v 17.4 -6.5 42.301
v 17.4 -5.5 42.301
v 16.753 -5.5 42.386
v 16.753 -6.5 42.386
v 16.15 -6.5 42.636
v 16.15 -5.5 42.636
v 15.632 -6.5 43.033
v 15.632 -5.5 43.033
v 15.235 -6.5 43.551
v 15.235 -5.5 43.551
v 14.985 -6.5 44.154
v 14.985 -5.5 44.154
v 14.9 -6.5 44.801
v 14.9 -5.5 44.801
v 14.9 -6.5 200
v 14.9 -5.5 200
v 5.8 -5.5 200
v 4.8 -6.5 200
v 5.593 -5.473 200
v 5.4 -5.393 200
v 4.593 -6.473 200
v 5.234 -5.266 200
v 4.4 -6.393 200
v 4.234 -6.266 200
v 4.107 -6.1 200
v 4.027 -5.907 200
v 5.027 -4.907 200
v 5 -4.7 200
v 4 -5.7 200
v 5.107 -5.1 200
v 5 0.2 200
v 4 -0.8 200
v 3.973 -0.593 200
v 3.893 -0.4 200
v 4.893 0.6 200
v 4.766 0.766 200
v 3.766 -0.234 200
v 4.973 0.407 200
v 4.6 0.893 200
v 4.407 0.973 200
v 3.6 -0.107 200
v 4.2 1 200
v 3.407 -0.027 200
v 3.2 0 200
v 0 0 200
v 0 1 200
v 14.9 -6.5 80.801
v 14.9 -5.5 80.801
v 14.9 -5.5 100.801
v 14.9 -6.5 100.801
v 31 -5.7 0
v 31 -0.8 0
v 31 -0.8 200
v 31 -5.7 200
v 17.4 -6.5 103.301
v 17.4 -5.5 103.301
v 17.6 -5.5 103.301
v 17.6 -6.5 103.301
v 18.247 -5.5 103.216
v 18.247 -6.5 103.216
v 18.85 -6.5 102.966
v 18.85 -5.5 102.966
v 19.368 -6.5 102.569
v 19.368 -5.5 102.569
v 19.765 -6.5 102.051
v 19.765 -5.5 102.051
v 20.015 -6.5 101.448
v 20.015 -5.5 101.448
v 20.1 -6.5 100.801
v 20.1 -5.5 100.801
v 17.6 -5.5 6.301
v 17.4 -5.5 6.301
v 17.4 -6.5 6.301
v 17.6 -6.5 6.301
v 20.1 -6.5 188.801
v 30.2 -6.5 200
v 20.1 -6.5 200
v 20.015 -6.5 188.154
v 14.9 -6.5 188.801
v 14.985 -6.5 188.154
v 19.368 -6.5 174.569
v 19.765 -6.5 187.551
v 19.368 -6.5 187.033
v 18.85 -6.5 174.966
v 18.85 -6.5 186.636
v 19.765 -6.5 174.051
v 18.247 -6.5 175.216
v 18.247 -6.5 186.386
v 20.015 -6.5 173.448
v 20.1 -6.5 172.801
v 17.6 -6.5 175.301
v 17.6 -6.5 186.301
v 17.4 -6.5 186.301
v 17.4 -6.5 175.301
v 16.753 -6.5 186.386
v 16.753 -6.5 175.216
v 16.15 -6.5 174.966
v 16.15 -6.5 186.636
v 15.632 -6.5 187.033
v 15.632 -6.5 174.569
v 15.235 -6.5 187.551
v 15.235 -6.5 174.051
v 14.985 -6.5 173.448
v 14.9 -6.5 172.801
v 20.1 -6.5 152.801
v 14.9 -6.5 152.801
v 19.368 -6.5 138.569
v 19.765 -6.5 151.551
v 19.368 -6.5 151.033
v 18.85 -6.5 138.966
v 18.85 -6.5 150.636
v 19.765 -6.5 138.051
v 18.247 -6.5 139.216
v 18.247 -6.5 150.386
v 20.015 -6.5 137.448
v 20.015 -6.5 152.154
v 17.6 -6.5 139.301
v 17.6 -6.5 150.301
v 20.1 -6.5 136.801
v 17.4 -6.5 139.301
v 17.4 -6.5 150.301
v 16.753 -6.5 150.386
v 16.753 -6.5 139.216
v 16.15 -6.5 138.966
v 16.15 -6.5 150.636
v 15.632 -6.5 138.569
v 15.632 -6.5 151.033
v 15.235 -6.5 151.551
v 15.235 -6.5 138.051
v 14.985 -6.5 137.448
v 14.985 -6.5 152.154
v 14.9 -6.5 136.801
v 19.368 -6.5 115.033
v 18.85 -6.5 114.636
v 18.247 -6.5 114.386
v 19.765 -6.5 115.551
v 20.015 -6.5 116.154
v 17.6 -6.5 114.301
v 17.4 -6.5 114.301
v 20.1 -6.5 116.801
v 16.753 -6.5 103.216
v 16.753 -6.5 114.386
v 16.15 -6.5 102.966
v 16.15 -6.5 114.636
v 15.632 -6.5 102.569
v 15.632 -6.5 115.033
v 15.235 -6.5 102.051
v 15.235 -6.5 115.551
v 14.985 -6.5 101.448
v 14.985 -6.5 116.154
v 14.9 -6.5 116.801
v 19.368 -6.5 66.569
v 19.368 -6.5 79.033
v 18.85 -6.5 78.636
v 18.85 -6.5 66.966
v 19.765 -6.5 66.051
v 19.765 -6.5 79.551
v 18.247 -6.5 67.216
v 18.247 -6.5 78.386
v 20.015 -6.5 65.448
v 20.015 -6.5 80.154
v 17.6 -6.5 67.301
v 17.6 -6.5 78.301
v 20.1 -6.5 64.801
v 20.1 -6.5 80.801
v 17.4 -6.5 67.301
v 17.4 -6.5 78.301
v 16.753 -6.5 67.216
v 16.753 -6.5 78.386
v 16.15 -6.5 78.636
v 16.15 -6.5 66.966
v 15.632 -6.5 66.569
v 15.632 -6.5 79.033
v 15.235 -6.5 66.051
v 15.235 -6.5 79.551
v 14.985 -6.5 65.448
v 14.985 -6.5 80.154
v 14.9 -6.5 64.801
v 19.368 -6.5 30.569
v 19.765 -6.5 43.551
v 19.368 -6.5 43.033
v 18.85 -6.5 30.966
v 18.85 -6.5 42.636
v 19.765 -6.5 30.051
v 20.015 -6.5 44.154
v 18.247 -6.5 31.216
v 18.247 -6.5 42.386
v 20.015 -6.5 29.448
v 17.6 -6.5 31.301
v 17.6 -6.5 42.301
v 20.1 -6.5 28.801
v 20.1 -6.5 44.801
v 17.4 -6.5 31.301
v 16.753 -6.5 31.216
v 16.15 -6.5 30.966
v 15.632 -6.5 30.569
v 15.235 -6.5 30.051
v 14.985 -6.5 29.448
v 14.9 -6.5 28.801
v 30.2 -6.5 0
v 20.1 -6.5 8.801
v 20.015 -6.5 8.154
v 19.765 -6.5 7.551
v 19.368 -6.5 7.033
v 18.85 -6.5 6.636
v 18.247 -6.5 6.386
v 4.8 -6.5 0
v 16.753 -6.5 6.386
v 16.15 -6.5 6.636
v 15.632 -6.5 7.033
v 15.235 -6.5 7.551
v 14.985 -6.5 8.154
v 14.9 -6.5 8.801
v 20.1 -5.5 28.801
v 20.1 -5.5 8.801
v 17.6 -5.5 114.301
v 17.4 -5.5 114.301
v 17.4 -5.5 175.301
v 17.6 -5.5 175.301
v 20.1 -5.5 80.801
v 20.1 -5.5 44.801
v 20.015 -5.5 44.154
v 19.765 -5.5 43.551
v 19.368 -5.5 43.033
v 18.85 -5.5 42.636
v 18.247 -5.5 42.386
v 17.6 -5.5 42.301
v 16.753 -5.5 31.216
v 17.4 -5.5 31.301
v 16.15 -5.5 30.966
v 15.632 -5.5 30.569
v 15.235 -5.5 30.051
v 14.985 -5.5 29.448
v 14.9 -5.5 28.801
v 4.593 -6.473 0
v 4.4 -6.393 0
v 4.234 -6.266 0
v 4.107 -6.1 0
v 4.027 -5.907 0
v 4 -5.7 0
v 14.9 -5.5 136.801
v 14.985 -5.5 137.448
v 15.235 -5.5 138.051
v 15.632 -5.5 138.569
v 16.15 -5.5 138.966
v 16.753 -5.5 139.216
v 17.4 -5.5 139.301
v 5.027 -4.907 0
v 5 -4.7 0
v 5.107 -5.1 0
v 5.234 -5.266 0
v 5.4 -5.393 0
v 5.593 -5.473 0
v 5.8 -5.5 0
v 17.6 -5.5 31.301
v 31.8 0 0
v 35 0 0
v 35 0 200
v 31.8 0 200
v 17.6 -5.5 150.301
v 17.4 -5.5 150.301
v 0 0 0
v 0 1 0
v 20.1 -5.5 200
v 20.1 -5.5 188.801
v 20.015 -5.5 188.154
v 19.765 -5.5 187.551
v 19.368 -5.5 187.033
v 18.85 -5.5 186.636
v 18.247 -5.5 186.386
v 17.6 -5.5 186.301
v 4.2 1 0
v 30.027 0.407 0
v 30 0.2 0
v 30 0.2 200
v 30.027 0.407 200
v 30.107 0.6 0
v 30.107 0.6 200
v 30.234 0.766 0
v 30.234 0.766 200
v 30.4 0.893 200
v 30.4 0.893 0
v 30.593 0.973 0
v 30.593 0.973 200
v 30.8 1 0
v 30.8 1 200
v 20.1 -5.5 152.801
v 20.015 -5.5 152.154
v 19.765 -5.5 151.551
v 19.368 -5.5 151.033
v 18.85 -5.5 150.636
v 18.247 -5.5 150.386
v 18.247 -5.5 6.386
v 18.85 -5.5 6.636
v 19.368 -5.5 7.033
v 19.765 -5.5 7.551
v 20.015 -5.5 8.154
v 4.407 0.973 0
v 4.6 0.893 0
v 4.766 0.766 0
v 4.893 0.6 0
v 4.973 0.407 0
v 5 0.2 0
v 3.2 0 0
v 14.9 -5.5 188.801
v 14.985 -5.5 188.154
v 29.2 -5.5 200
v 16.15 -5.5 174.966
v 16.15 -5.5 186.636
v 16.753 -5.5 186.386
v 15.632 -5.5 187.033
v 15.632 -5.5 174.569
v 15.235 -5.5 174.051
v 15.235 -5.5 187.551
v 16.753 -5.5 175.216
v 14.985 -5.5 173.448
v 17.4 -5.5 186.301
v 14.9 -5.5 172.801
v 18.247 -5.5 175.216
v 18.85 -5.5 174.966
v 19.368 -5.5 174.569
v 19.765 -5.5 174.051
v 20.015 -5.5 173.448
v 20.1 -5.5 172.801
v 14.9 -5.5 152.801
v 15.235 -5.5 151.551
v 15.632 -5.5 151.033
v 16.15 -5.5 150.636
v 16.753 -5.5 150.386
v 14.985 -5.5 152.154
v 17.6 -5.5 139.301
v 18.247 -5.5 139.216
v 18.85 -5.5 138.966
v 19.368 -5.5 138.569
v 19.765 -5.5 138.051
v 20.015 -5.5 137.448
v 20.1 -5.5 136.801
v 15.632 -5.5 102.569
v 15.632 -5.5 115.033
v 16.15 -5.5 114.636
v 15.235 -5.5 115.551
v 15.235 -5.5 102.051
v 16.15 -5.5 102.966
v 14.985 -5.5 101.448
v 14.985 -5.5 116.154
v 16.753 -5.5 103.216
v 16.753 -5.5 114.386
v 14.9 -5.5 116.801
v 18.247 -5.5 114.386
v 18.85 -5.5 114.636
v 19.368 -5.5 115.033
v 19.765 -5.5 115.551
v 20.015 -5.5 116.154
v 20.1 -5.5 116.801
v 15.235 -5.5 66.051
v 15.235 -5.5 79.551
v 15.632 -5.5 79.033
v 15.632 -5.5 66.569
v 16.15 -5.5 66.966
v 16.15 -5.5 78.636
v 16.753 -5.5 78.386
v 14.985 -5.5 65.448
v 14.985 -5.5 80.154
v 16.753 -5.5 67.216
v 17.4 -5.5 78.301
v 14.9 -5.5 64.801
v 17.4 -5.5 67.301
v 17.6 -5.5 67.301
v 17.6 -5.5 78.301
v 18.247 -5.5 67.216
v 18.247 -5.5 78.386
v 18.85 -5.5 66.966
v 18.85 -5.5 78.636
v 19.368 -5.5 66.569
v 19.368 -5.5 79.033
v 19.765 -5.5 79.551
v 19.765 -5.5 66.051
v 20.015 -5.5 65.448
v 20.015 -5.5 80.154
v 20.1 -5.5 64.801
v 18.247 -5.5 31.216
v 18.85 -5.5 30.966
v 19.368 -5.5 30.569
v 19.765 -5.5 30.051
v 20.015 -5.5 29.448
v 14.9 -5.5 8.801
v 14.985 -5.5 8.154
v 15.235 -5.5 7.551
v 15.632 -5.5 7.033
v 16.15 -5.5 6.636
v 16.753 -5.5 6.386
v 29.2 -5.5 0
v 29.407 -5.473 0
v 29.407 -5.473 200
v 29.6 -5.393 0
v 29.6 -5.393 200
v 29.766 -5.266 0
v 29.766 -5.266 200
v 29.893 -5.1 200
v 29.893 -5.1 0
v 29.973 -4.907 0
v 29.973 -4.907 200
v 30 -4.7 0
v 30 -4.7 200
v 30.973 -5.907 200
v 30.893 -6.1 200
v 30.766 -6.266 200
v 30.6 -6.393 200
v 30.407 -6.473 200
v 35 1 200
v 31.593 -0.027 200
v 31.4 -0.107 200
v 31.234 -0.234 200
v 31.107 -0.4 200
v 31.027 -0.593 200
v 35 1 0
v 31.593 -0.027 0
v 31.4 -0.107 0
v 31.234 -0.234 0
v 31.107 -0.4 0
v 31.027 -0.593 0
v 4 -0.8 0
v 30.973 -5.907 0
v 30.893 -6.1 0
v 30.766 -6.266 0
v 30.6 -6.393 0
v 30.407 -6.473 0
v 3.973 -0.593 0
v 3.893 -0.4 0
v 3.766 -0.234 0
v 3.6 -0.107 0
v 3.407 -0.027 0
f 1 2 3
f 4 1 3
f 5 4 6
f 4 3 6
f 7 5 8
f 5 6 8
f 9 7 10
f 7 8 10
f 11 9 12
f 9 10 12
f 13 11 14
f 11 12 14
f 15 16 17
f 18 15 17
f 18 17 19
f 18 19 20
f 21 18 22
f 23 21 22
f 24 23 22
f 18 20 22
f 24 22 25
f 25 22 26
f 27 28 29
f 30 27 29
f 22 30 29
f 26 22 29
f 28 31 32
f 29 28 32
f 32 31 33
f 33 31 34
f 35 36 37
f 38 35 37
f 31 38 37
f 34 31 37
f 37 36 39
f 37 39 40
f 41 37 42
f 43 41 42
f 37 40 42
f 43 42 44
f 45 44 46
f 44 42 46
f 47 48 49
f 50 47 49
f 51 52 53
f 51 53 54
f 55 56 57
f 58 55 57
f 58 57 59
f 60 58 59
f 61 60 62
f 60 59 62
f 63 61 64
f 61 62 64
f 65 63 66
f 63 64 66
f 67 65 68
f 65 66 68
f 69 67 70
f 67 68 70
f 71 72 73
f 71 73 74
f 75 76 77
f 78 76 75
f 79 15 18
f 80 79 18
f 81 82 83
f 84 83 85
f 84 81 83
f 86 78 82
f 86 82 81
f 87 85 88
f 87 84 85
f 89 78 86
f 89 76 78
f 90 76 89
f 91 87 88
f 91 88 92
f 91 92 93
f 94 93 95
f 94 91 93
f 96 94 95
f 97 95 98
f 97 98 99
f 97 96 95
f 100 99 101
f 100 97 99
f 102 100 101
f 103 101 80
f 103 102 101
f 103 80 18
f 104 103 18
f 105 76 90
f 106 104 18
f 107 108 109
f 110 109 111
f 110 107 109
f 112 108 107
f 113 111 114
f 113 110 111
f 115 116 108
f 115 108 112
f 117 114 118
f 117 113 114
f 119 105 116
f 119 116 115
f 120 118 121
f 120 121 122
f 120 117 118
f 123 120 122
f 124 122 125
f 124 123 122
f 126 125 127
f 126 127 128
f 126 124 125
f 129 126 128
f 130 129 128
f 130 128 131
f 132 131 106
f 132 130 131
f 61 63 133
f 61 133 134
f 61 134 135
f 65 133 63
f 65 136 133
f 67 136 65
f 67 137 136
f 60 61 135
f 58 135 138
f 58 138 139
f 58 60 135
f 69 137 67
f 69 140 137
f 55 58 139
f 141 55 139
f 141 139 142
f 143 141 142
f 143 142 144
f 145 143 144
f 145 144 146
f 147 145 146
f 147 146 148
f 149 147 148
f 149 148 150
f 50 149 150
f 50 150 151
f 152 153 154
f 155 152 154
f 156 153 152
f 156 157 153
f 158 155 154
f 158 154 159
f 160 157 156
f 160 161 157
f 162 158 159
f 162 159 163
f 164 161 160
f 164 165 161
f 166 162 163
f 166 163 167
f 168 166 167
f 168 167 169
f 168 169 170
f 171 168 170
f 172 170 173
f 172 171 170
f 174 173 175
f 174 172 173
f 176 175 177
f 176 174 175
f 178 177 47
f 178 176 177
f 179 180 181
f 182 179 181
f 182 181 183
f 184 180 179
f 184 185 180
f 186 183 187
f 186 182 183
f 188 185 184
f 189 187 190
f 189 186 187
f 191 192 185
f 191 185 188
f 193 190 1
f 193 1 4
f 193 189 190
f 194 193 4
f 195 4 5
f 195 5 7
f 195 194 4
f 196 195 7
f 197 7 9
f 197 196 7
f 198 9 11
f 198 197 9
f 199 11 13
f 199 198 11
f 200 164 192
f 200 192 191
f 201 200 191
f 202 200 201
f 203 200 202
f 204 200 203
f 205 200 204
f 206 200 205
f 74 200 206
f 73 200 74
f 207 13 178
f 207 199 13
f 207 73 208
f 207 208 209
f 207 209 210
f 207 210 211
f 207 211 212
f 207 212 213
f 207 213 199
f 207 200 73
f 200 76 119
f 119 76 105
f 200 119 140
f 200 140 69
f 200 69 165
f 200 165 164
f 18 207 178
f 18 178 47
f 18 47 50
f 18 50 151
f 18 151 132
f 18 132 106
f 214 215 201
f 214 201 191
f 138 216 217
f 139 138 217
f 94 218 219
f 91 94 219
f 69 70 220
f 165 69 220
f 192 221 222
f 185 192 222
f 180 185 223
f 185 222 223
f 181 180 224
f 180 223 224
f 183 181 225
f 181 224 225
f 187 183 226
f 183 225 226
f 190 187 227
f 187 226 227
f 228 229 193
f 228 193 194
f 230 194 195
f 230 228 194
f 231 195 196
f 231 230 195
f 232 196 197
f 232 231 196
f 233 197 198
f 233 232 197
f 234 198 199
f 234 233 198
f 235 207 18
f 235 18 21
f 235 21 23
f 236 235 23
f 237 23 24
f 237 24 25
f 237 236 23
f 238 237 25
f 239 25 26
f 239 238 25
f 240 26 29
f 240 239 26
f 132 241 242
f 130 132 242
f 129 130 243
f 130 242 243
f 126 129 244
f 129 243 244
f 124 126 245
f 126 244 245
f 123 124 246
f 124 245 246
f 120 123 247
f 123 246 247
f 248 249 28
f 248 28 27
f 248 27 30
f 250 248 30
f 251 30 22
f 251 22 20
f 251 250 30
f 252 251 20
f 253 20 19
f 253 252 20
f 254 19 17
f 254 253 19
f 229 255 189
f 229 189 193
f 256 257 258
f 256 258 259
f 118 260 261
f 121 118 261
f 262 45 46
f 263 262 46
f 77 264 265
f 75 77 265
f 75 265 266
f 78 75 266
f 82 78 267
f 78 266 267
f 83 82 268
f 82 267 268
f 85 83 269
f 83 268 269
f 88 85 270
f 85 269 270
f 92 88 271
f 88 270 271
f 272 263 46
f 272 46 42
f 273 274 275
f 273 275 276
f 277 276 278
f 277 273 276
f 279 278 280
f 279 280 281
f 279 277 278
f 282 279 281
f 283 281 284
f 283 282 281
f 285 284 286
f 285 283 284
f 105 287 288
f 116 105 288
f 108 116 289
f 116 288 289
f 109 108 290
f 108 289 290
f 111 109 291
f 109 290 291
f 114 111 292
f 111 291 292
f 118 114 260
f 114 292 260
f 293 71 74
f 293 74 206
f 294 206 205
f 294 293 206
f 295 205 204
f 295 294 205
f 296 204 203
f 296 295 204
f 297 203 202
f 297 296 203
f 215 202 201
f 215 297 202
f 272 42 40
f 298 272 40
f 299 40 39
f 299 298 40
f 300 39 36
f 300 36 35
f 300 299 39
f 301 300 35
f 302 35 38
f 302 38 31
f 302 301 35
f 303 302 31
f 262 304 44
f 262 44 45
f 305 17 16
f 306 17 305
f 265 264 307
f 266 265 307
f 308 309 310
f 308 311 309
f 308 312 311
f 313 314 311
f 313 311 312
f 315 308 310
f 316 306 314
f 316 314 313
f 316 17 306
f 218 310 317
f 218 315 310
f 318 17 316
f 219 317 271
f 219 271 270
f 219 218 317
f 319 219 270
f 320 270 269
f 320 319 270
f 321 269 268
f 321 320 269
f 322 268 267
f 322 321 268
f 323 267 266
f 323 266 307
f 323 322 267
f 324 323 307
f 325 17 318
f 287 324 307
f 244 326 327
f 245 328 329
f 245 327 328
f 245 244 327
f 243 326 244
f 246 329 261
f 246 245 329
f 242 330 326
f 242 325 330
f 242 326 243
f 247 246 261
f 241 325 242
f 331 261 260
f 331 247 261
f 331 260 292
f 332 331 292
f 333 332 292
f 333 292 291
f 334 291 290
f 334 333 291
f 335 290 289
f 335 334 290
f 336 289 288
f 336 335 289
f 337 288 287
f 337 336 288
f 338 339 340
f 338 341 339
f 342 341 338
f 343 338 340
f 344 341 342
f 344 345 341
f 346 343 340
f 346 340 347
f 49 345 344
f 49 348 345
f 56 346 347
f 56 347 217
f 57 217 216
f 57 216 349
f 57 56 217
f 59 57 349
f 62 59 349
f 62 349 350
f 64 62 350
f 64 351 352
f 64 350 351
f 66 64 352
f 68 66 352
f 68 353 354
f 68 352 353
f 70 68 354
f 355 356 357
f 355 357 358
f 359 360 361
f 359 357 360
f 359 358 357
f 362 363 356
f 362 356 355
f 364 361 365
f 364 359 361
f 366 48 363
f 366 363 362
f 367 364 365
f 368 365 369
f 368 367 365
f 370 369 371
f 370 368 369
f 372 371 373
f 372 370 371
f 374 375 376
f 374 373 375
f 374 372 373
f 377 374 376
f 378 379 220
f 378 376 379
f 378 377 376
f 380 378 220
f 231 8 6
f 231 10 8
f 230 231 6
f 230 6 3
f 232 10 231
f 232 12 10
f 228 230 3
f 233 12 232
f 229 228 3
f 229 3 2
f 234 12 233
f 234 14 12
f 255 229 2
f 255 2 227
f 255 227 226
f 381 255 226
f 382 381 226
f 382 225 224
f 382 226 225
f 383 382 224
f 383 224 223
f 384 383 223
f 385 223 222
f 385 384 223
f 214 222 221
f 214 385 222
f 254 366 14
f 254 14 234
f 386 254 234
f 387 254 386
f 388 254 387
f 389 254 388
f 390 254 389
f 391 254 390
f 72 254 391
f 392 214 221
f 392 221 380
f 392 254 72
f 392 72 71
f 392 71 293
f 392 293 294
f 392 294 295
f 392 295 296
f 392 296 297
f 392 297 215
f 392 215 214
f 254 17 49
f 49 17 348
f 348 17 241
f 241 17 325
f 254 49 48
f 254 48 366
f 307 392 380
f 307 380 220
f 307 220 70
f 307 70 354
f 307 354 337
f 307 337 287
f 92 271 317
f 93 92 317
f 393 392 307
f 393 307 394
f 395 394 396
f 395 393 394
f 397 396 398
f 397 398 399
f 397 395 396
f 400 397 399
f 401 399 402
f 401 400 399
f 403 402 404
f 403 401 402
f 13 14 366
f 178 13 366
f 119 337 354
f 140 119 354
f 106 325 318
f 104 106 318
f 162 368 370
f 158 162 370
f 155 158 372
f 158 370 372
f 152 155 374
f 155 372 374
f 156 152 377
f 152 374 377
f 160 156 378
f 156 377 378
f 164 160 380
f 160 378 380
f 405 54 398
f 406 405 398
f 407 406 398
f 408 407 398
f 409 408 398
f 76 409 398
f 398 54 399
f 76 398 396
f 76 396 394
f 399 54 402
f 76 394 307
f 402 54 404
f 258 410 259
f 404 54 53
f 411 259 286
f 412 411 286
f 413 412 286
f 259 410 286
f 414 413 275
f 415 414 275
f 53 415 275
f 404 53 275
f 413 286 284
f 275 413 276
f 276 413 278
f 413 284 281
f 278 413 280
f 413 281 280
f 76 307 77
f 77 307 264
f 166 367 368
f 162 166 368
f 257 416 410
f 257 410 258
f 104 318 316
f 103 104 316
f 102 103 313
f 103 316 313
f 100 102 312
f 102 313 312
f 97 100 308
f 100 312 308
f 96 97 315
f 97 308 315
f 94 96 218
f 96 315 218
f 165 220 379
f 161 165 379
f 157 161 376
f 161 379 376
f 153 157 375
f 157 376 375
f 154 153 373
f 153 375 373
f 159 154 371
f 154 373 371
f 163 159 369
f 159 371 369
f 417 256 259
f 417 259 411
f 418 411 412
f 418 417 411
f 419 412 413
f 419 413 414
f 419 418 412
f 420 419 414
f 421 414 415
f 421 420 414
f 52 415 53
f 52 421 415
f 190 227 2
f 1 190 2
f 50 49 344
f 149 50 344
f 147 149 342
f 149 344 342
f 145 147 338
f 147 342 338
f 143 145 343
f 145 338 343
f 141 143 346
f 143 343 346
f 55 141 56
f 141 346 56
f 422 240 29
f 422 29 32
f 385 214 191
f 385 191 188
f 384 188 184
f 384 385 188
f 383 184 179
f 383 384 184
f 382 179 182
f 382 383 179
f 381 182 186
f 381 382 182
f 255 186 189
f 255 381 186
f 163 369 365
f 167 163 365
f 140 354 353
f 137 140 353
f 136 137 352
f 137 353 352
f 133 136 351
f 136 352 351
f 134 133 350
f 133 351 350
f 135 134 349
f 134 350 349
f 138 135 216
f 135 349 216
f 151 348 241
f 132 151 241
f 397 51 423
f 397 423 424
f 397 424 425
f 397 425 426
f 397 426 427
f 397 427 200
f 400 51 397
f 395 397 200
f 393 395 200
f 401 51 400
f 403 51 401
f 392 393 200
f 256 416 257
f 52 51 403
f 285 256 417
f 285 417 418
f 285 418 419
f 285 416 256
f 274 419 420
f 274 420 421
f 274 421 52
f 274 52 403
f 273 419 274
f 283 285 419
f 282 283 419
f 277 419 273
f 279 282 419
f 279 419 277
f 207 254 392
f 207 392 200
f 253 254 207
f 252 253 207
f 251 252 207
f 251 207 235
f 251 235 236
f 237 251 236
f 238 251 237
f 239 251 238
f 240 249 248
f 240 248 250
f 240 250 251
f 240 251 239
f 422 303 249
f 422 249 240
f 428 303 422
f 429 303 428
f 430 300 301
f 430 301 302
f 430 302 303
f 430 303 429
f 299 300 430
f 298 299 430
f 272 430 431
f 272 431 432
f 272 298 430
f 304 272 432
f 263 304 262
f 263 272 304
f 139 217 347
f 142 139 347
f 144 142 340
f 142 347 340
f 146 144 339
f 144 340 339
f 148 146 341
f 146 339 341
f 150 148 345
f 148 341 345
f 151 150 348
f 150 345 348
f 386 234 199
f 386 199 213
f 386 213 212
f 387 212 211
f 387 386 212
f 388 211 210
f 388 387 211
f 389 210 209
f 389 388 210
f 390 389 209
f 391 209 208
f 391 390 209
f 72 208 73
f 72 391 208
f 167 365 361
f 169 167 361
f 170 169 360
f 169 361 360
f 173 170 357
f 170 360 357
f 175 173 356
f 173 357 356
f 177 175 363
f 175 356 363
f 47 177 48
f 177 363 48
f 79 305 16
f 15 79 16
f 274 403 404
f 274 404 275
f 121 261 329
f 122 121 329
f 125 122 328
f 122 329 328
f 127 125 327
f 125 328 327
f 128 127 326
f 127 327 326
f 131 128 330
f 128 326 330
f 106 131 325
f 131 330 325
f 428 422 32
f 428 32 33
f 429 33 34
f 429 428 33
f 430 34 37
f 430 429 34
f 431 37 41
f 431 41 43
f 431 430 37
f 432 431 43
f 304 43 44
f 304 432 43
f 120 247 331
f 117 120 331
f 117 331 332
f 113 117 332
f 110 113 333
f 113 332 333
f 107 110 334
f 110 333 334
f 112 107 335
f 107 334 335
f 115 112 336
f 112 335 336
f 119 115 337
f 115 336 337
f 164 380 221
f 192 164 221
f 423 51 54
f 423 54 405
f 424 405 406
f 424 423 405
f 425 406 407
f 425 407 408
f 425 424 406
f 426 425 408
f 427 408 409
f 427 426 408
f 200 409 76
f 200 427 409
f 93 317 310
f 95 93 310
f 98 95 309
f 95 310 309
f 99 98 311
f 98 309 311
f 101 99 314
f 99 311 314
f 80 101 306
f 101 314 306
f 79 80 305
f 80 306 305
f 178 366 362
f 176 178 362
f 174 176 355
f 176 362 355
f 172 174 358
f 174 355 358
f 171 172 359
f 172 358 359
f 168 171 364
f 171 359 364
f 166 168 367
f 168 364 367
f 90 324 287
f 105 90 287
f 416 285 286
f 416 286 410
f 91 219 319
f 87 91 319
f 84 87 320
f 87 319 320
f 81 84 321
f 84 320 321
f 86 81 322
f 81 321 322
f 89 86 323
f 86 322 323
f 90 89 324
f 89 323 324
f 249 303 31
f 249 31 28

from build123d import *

# Parameters (mm, degrees)
BOSS_EXTRUDE1_DEPTH = 200
CUT_EXTRUDE1_DEPTH  = 2


with BuildPart() as part:
    # Sketch1 → Boss-Extrude1 (new body)
    with BuildSketch(Plane.XY):
        with BuildLine():
            Line((0, 0), (0, 1))
            Line((0, 1), (4.2, 1))
            ThreePointArc((4.2, 1), (4.765685425, 0.765685425), (5, 0.2))
            Line((5, 0.2), (5, -4.7))
            ThreePointArc((5, -4.7), (5.234314575, -5.265685425), (5.8, -5.5))
            Line((5.8, -5.5), (29.2, -5.5))
            ThreePointArc((29.2, -5.5), (29.765685425, -5.265685425), (30, -4.7))
            Line((30, -4.7), (30, 0.2))
            ThreePointArc((30, 0.2), (30.234314575, 0.765685425), (30.8, 1))
            Line((30.8, 1), (35, 1))
            Line((35, 1), (35, 0))
            Line((35, 0), (31.8, 0))
            ThreePointArc((31.8, 0), (31.234314575, -0.234314575), (31, -0.8))
            Line((31, -0.8), (31, -5.7))
            ThreePointArc((31, -5.7), (30.765685425, -6.265685425), (30.2, -6.5))
            Line((30.2, -6.5), (4.8, -6.5))
            ThreePointArc((4.8, -6.5), (4.234314575, -6.265685425), (4, -5.7))
            Line((4, -5.7), (4, -0.8))
            ThreePointArc((4, -0.8), (3.765685425, -0.234314575), (3.2, 0))
            Line((3.2, 0), (0, 0))
        make_face()
    extrude(amount=BOSS_EXTRUDE1_DEPTH)

    # Sketch2 → Cut-Extrude1 (cut, through all)
    with BuildSketch(Plane(origin=(0, -5.5, 0), x_dir=(1, 0, 0), z_dir=(0, 1, 0))):
        with BuildLine():
            Line((17.4, -6.300946702), (17.6, -6.300946702))
            ThreePointArc((17.6, -6.300946702), (19.367766953, -7.033179749), (20.1, -8.800946702))
            Line((20.1, -8.800946702), (20.1, -28.800946702))
            ThreePointArc((20.1, -28.800946702), (19.367766953, -30.568713655), (17.6, -31.300946702))
            Line((17.6, -31.300946702), (17.4, -31.300946702))
            ThreePointArc((17.4, -31.300946702), (15.632233047, -30.568713655), (14.9, -28.800946702))
            Line((14.9, -28.800946702), (14.9, -8.800946702))
            ThreePointArc((14.9, -8.800946702), (15.632233047, -7.033179749), (17.4, -6.300946702))
        make_face()
        with BuildLine():
            Line((14.9, -44.800946702), (14.9, -64.800946702))
            ThreePointArc((14.9, -64.800946702), (15.632233047, -66.568713655), (17.4, -67.300946702))
            Line((17.4, -67.300946702), (17.6, -67.300946702))
            ThreePointArc((17.6, -67.300946702), (19.367766953, -66.568713655), (20.1, -64.800946702))
            Line((20.1, -64.800946702), (20.1, -44.800946702))
            ThreePointArc((20.1, -44.800946702), (19.367766953, -43.033179749), (17.6, -42.300946702))
            Line((17.6, -42.300946702), (17.4, -42.300946702))
            ThreePointArc((17.4, -42.300946702), (15.632233047, -43.033179749), (14.9, -44.800946702))
        make_face()
        with BuildLine():
            Line((14.9, -80.800946702), (14.9, -100.800946702))
            ThreePointArc((14.9, -100.800946702), (15.632233047, -102.568713655), (17.4, -103.300946702))
            Line((17.4, -103.300946702), (17.6, -103.300946702))
            ThreePointArc((17.6, -103.300946702), (19.367766953, -102.568713655), (20.1, -100.800946702))
            Line((20.1, -100.800946702), (20.1, -80.800946702))
            ThreePointArc((20.1, -80.800946702), (19.367766953, -79.033179749), (17.6, -78.300946702))
            Line((17.6, -78.300946702), (17.4, -78.300946702))
            ThreePointArc((17.4, -78.300946702), (15.632233047, -79.033179749), (14.9, -80.800946702))
        make_face()
        with BuildLine():
            Line((14.9, -116.800946702), (14.9, -136.800946702))
            ThreePointArc((14.9, -136.800946702), (15.632233047, -138.568713655), (17.4, -139.300946702))
            Line((17.4, -139.300946702), (17.6, -139.300946702))
            ThreePointArc((17.6, -139.300946702), (19.367766953, -138.568713655), (20.1, -136.800946702))
            Line((20.1, -136.800946702), (20.1, -116.800946702))
            ThreePointArc((20.1, -116.800946702), (19.367766953, -115.033179749), (17.6, -114.300946702))
            Line((17.6, -114.300946702), (17.4, -114.300946702))
            ThreePointArc((17.4, -114.300946702), (15.632233047, -115.033179749), (14.9, -116.800946702))
        make_face()
        with BuildLine():
            Line((14.9, -152.800946702), (14.9, -172.800946702))
            ThreePointArc((14.9, -172.800946702), (15.632233047, -174.568713655), (17.4, -175.300946702))
            Line((17.4, -175.300946702), (17.6, -175.300946702))
            ThreePointArc((17.6, -175.300946702), (19.367766953, -174.568713655), (20.1, -172.800946702))
            Line((20.1, -172.800946702), (20.1, -152.800946702))
            ThreePointArc((20.1, -152.800946702), (19.367766953, -151.033179749), (17.6, -150.300946702))
            Line((17.6, -150.300946702), (17.4, -150.300946702))
            ThreePointArc((17.4, -150.300946702), (15.632233047, -151.033179749), (14.9, -152.800946702))
        make_face()
        with BuildLine():
            Line((14.9, -188.800946702), (14.9, -208.800946702))
            ThreePointArc((14.9, -208.800946702), (15.632233047, -210.568713655), (17.4, -211.300946702))
            Line((17.4, -211.300946702), (17.6, -211.300946702))
            ThreePointArc((17.6, -211.300946702), (19.367766953, -210.568713655), (20.1, -208.800946702))
            Line((20.1, -208.800946702), (20.1, -188.800946702))
            ThreePointArc((20.1, -188.800946702), (19.367766953, -187.033179749), (17.6, -186.300946702))
            Line((17.6, -186.300946702), (17.4, -186.300946702))
            ThreePointArc((17.4, -186.300946702), (15.632233047, -187.033179749), (14.9, -188.800946702))
        make_face()
    extrude(amount=-CUT_EXTRUDE1_DEPTH, mode=Mode.SUBTRACT)


solid = part.part
